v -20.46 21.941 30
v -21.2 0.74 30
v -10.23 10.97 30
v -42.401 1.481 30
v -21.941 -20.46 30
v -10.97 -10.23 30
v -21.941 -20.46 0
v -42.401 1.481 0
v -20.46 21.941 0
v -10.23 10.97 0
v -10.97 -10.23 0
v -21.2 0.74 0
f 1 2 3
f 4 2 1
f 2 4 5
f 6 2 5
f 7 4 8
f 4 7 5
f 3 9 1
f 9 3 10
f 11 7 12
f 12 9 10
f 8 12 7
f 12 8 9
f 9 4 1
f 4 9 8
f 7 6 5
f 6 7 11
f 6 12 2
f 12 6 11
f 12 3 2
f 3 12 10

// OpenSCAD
rotate([0,0,88])
rotate([0,-90,0]){
    difference(){
        rotate([-45,0,0]) {
            cube([30, 30, 30]);
        }
        scale([1,0.5,0.5]) {
            rotate([-45,0,0]) {
                cube([30, 30, 30]);
            }
        }
    }
}
